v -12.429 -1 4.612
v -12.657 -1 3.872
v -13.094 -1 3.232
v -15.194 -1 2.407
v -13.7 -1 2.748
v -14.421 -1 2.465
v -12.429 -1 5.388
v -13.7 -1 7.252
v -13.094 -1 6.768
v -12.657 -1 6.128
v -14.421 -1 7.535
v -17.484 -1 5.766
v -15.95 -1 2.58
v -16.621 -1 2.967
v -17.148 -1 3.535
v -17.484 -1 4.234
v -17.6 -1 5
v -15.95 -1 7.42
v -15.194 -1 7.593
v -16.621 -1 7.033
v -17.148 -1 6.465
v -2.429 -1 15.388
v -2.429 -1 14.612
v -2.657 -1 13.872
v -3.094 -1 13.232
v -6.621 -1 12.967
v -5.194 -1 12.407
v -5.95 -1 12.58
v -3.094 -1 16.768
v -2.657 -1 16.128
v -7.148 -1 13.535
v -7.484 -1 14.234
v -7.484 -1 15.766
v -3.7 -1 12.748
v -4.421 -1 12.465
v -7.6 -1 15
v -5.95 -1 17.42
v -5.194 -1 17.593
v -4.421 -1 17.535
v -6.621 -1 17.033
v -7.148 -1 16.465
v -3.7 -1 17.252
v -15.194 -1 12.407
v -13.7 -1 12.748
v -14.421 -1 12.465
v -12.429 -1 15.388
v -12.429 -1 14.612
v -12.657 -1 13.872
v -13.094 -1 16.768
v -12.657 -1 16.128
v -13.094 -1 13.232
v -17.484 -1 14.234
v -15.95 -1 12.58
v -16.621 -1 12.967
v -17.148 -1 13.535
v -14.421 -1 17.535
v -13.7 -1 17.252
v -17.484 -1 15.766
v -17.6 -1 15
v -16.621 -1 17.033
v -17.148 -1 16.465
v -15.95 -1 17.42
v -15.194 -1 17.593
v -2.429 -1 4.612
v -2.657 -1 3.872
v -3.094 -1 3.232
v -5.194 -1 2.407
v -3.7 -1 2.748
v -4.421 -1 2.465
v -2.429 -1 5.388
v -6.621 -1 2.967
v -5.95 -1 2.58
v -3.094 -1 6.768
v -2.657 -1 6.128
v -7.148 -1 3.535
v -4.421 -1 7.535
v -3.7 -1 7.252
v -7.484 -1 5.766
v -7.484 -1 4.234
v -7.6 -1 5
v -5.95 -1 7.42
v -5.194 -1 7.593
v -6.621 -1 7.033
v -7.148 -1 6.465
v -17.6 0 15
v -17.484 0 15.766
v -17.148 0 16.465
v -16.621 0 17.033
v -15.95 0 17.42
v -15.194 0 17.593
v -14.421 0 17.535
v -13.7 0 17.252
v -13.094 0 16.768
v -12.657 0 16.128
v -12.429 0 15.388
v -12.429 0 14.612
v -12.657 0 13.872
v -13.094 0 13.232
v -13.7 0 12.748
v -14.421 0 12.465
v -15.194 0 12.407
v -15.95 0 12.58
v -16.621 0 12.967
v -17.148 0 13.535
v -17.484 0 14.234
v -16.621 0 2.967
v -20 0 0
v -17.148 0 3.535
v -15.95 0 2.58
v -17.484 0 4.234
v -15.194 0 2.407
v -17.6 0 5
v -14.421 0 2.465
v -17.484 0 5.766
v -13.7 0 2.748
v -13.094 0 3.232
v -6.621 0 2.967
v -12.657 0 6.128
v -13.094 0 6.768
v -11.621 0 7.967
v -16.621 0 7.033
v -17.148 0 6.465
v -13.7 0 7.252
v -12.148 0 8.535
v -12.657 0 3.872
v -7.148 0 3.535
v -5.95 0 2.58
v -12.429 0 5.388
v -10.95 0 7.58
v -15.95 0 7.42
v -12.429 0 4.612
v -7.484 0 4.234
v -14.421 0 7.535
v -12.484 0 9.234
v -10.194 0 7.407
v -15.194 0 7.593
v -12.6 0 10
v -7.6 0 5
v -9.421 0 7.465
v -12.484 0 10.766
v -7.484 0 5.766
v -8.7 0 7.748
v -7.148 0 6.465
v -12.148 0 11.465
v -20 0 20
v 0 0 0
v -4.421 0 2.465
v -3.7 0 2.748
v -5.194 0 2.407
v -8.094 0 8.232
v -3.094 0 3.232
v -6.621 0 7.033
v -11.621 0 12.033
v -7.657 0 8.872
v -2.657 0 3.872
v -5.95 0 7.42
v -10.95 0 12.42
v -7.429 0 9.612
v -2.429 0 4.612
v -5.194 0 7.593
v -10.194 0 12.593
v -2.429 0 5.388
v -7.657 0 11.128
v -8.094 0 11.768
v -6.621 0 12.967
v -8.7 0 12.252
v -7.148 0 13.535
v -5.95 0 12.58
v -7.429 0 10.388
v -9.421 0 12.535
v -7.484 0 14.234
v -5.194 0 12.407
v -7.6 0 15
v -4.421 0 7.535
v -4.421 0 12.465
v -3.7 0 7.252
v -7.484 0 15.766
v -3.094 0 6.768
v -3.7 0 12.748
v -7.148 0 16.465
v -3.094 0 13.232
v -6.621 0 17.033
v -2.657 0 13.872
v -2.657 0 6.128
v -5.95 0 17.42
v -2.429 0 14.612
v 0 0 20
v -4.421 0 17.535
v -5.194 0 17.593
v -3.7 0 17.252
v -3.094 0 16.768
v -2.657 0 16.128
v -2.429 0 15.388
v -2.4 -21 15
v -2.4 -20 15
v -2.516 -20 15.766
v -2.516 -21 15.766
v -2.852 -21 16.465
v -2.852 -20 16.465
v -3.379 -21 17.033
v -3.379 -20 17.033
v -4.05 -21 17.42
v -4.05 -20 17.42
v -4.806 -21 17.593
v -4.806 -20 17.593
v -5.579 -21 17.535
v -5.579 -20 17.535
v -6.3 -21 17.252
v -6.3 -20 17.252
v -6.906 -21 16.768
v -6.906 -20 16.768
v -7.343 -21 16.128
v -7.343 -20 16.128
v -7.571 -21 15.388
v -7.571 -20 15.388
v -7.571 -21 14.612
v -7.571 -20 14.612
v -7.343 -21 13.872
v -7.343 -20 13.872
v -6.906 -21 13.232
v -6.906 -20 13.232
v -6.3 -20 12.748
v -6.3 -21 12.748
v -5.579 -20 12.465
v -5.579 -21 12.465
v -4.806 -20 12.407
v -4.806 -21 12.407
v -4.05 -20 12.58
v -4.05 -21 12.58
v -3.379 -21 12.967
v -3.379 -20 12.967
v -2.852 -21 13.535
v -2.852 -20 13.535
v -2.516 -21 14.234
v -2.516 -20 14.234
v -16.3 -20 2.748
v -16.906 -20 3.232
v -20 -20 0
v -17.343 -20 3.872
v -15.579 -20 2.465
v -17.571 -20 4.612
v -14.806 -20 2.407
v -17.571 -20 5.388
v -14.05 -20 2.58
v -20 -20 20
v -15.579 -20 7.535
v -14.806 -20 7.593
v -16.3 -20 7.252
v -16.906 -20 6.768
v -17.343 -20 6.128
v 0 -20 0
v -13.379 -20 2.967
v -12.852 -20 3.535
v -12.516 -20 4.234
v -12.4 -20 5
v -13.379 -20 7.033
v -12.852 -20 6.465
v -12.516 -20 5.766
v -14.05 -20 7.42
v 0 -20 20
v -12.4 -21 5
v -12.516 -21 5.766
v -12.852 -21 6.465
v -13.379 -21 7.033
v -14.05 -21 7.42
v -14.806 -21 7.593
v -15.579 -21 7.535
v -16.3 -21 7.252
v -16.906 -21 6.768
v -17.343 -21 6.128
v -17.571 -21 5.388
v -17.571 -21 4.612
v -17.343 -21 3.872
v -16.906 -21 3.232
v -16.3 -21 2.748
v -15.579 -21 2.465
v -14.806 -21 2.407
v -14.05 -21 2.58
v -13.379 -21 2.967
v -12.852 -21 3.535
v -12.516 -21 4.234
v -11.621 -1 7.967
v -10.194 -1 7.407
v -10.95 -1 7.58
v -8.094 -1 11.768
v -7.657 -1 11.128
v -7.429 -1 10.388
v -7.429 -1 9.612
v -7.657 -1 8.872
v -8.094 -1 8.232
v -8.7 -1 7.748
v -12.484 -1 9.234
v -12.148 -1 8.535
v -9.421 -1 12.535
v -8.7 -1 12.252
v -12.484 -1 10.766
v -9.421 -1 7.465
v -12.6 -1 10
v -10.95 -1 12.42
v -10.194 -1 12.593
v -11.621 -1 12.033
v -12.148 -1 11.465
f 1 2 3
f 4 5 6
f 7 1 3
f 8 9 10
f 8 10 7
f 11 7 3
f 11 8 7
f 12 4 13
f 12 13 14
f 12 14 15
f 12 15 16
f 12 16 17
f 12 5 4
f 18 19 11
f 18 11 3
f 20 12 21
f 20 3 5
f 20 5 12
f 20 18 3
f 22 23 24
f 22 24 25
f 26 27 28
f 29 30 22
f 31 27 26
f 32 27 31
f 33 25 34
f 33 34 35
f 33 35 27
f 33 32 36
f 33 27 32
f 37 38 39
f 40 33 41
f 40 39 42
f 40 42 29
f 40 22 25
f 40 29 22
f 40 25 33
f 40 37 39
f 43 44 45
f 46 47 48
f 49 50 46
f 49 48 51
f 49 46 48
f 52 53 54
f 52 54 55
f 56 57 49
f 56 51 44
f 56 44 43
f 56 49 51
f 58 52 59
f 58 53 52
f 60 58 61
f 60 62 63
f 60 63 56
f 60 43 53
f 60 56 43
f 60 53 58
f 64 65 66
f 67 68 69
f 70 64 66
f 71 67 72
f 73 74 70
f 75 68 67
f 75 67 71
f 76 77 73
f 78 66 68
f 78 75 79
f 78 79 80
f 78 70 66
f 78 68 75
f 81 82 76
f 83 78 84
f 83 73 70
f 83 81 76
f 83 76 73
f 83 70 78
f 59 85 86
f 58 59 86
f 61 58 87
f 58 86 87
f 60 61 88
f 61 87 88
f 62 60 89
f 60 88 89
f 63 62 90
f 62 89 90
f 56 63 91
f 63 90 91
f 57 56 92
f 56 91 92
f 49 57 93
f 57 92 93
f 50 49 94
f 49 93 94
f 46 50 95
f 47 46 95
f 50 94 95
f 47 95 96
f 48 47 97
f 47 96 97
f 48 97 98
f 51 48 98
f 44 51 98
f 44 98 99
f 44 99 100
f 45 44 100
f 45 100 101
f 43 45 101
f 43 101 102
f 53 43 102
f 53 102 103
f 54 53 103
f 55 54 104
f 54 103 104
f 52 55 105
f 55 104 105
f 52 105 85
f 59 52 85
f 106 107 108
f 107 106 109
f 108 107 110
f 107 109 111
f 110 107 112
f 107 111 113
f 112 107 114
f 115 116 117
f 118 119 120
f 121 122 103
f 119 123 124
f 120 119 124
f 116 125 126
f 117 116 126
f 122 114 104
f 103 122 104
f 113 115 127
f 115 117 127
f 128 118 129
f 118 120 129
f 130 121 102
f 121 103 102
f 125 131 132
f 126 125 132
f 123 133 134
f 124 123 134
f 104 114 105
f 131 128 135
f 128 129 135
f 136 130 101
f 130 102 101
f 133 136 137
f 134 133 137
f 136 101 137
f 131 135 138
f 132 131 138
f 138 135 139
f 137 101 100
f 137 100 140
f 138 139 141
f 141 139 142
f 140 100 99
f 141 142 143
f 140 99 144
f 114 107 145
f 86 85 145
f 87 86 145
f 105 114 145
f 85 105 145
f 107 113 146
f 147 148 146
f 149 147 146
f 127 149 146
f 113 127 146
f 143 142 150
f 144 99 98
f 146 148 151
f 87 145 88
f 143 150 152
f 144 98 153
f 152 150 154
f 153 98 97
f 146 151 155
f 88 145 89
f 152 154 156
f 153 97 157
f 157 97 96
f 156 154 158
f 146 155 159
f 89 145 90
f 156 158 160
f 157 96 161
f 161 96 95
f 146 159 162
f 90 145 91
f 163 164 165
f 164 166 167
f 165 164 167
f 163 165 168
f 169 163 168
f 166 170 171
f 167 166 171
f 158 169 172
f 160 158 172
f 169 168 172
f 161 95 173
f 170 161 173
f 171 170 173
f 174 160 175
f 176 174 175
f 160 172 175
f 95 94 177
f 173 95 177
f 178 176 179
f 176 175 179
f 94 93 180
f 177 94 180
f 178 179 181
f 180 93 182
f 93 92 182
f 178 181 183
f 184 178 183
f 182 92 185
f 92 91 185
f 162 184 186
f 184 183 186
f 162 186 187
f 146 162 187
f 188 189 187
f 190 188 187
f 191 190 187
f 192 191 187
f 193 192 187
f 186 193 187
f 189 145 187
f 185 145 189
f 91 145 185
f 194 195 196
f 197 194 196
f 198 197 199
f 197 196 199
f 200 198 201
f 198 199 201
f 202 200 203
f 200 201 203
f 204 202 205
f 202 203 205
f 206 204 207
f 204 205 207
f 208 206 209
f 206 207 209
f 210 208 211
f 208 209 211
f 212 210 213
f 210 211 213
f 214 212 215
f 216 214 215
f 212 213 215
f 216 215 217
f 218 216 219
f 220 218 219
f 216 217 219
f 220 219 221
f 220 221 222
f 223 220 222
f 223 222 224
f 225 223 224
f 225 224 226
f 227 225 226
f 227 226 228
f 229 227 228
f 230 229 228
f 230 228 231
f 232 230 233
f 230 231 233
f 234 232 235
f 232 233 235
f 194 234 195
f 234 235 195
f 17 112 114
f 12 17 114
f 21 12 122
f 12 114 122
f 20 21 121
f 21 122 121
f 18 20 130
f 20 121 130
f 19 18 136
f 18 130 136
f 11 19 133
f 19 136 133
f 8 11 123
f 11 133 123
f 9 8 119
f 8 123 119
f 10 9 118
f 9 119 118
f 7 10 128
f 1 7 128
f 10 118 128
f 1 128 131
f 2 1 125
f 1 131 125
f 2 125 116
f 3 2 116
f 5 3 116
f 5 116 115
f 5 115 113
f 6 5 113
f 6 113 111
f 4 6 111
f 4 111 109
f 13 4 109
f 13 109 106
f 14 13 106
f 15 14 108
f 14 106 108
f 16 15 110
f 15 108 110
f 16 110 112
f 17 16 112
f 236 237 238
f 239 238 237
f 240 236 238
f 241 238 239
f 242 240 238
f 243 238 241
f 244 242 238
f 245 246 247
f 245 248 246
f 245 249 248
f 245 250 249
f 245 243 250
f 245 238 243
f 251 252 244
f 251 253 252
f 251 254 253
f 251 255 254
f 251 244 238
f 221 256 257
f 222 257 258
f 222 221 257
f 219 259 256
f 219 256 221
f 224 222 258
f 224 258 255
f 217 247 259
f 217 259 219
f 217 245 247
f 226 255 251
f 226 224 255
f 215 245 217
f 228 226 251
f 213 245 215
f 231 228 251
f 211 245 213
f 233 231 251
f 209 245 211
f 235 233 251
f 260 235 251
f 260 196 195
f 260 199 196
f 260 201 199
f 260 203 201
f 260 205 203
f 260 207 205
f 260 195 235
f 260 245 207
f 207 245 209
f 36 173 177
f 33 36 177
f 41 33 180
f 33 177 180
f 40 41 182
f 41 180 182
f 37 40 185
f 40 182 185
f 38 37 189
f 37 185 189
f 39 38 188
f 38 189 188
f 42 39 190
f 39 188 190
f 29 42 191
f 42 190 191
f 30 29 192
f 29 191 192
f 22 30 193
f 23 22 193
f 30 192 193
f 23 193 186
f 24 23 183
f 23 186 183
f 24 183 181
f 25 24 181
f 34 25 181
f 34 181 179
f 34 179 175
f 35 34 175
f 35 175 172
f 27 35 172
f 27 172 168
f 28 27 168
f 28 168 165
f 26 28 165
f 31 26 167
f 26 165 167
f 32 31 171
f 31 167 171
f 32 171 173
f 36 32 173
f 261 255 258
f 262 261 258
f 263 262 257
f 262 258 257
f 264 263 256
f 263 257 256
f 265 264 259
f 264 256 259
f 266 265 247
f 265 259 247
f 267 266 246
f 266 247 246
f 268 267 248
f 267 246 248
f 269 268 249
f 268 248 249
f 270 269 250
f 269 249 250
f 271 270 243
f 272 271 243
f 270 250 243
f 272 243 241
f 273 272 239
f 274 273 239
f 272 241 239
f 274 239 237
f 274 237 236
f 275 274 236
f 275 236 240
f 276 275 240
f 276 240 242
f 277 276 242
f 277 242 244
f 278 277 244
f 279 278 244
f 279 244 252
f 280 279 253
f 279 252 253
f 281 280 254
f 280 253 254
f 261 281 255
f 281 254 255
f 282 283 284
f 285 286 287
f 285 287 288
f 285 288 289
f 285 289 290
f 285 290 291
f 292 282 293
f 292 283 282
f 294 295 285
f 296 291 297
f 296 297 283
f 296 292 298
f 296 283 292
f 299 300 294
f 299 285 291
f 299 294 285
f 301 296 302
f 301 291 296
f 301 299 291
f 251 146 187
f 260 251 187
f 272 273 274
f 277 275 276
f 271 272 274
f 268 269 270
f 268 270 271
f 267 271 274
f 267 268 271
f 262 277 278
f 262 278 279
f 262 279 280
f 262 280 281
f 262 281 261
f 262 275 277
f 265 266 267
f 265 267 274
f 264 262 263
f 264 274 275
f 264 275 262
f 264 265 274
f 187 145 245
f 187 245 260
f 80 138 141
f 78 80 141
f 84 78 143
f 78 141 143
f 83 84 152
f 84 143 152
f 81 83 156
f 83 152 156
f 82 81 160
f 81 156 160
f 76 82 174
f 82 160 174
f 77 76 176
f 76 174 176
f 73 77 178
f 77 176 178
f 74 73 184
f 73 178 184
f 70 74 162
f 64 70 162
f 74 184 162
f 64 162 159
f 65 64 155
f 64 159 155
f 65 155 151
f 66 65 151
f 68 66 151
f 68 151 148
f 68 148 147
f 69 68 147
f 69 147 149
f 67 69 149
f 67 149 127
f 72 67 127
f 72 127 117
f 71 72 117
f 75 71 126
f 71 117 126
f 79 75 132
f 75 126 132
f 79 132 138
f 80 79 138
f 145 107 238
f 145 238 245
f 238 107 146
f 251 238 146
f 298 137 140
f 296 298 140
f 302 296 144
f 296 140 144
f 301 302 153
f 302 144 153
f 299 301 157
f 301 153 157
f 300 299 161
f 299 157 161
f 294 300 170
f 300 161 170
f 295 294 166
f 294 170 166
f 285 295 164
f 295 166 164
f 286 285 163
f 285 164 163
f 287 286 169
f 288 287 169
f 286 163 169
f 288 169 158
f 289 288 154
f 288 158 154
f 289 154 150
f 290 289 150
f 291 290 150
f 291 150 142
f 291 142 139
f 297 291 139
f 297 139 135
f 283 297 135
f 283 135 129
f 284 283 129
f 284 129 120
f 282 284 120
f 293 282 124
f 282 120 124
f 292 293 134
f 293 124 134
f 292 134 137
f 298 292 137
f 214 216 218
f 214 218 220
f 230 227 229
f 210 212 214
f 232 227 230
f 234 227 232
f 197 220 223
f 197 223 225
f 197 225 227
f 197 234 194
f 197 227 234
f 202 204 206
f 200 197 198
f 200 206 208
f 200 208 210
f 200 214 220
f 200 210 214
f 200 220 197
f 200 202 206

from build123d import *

# Parameters (mm, degrees)
F0_W     = 20
F0_H     = 20
F1_DEPTH = 20
F2_R     = 2.6
F3_DEPTH = 1
F4_R     = 2.6
F5_DEPTH = 1


with BuildPart() as f1:
    # F0 (on Front) → F1 (new body)
    with BuildSketch(Plane.XZ):
        with Locations((-10, 10)):
            Rectangle(F0_W, F0_H)
    extrude(amount=F1_DEPTH)

    # F2 (on face) → F3 (cut)
    with BuildSketch(Plane(origin=(0, 0, 0), x_dir=(-1, 0, 0), z_dir=(0, 1, 0))):
        with Locations((10, 10)):
            Circle(F2_R)
        with Locations((5, 15)):
            Circle(F2_R)
        with Locations((5, 5)):
            Circle(F2_R)
        with Locations((15, 15)):
            Circle(F2_R)
        with Locations((15, 5)):
            Circle(F2_R)
    extrude(amount=-F3_DEPTH, mode=Mode.SUBTRACT)

    # F4 (on face) → F5 (join)
    with BuildSketch(Plane.XZ.offset(20)):
        with Locations((-5, 15)):
            Circle(F4_R)
        with Locations((-15, 5)):
            Circle(F4_R)
    extrude(amount=F5_DEPTH)


solid = f1.part
